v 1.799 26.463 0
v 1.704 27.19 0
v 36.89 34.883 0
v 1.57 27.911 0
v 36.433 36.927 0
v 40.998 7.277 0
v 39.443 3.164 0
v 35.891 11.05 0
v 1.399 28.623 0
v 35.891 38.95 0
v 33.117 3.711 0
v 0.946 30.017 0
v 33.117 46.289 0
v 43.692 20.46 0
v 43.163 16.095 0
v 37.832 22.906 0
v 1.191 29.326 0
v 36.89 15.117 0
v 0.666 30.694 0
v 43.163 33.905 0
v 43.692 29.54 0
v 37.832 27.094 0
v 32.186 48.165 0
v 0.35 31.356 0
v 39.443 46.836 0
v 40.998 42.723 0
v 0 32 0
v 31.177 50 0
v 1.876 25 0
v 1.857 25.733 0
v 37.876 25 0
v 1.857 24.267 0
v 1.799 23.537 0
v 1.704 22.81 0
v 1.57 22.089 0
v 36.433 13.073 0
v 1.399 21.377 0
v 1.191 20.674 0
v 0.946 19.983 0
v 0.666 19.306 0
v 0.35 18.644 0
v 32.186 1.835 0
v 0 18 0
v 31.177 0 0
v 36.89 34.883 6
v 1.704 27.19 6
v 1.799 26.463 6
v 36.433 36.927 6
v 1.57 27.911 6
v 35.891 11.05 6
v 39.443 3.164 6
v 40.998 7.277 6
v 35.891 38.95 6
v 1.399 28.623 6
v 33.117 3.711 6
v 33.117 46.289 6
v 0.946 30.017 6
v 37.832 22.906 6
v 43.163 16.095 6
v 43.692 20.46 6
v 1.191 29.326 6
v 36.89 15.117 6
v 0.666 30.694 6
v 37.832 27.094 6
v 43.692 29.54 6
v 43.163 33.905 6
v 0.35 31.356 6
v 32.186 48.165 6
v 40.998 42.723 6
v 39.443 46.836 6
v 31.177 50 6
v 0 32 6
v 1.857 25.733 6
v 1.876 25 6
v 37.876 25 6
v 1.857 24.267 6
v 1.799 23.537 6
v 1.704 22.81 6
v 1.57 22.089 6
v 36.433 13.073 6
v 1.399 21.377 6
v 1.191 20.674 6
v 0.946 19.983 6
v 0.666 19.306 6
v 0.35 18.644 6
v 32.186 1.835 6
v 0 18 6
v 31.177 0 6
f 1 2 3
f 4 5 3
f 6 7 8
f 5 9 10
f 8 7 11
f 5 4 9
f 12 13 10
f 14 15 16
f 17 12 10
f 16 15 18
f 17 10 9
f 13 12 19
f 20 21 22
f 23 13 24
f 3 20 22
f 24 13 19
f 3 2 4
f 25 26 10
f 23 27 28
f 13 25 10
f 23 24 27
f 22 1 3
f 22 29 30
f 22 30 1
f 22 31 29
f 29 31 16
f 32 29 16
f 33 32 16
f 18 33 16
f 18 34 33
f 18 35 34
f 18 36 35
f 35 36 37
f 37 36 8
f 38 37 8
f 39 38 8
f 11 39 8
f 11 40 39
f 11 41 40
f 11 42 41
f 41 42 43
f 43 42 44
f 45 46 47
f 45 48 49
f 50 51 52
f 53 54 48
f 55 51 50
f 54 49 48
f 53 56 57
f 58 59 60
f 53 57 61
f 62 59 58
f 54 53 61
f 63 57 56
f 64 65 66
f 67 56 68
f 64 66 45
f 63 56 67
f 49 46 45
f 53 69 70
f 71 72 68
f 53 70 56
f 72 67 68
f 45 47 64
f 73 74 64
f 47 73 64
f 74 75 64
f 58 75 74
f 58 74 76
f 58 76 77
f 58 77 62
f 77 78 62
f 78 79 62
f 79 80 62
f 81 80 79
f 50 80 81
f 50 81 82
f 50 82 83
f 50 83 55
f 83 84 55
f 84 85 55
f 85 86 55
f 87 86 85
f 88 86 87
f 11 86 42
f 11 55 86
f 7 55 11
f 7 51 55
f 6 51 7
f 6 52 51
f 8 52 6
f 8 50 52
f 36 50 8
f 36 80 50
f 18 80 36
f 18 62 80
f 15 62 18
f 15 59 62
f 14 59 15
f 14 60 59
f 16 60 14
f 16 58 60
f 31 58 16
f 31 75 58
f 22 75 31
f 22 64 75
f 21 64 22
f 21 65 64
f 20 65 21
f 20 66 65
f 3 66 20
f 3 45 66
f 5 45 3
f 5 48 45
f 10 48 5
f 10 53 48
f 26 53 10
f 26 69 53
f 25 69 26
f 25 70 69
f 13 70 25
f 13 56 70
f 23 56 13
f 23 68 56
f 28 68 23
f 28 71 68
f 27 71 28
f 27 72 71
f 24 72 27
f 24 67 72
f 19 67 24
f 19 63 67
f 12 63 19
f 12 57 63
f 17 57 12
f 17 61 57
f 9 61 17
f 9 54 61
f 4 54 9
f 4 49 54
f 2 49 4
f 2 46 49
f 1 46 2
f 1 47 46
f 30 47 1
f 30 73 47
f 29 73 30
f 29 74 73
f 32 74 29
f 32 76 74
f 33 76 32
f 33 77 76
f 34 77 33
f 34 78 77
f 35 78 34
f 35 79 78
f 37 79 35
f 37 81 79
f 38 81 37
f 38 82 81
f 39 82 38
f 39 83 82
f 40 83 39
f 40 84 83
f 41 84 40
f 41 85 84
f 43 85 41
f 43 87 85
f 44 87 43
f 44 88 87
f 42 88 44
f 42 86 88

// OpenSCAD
$fn = 32;

// ----------------------------------------------------------------------
// Gear sector: 4 teeth on 60 degrees
// ----------------------------------------------------------------------

// --- parameters (mm) ---
sector_angle = 60;        // sector angle, degrees
root_r = 50;              // root circle radius
tooth_h = 6;              // tooth height over the root circle
teeth = 4;                // number of teeth on the sector
hub_r = 14;               // hub bore radius
plate_t = 6;              // sector thickness, Z
arc_step = 3;             // sampling step of the root/hub arcs, degrees

tip_r = root_r + tooth_h;  // tip circle radius

profile = [[31.177, 0], [32.186, 1.835], [33.117, 3.711], [39.443, 3.164], [40.998, 7.277], [35.891, 11.05], [36.433, 13.073], [36.89, 15.117], [43.163, 16.095], [43.692, 20.46], [37.832, 22.906], [37.876, 25], [37.832, 27.094], [43.692, 29.54], [43.163, 33.905], [36.89, 34.883], [36.433, 36.927], [35.891, 38.95], [40.998, 42.723], [39.443, 46.836], [33.117, 46.289], [32.186, 48.165], [31.177, 50], [0, 32], [0.35, 31.356], [0.666, 30.694], [0.946, 30.017], [1.191, 29.326], [1.399, 28.623], [1.57, 27.911], [1.704, 27.19], [1.799, 26.463], [1.857, 25.733], [1.876, 25], [1.857, 24.267], [1.799, 23.537], [1.704, 22.81], [1.57, 22.089], [1.399, 21.377], [1.191, 20.674], [0.946, 19.983], [0.666, 19.306], [0.35, 18.644], [0, 18]];  // primary outline, 44 points, counter clockwise

// --- the one profile operation ---
linear_extrude(height = plate_t) polygon(points = profile);
